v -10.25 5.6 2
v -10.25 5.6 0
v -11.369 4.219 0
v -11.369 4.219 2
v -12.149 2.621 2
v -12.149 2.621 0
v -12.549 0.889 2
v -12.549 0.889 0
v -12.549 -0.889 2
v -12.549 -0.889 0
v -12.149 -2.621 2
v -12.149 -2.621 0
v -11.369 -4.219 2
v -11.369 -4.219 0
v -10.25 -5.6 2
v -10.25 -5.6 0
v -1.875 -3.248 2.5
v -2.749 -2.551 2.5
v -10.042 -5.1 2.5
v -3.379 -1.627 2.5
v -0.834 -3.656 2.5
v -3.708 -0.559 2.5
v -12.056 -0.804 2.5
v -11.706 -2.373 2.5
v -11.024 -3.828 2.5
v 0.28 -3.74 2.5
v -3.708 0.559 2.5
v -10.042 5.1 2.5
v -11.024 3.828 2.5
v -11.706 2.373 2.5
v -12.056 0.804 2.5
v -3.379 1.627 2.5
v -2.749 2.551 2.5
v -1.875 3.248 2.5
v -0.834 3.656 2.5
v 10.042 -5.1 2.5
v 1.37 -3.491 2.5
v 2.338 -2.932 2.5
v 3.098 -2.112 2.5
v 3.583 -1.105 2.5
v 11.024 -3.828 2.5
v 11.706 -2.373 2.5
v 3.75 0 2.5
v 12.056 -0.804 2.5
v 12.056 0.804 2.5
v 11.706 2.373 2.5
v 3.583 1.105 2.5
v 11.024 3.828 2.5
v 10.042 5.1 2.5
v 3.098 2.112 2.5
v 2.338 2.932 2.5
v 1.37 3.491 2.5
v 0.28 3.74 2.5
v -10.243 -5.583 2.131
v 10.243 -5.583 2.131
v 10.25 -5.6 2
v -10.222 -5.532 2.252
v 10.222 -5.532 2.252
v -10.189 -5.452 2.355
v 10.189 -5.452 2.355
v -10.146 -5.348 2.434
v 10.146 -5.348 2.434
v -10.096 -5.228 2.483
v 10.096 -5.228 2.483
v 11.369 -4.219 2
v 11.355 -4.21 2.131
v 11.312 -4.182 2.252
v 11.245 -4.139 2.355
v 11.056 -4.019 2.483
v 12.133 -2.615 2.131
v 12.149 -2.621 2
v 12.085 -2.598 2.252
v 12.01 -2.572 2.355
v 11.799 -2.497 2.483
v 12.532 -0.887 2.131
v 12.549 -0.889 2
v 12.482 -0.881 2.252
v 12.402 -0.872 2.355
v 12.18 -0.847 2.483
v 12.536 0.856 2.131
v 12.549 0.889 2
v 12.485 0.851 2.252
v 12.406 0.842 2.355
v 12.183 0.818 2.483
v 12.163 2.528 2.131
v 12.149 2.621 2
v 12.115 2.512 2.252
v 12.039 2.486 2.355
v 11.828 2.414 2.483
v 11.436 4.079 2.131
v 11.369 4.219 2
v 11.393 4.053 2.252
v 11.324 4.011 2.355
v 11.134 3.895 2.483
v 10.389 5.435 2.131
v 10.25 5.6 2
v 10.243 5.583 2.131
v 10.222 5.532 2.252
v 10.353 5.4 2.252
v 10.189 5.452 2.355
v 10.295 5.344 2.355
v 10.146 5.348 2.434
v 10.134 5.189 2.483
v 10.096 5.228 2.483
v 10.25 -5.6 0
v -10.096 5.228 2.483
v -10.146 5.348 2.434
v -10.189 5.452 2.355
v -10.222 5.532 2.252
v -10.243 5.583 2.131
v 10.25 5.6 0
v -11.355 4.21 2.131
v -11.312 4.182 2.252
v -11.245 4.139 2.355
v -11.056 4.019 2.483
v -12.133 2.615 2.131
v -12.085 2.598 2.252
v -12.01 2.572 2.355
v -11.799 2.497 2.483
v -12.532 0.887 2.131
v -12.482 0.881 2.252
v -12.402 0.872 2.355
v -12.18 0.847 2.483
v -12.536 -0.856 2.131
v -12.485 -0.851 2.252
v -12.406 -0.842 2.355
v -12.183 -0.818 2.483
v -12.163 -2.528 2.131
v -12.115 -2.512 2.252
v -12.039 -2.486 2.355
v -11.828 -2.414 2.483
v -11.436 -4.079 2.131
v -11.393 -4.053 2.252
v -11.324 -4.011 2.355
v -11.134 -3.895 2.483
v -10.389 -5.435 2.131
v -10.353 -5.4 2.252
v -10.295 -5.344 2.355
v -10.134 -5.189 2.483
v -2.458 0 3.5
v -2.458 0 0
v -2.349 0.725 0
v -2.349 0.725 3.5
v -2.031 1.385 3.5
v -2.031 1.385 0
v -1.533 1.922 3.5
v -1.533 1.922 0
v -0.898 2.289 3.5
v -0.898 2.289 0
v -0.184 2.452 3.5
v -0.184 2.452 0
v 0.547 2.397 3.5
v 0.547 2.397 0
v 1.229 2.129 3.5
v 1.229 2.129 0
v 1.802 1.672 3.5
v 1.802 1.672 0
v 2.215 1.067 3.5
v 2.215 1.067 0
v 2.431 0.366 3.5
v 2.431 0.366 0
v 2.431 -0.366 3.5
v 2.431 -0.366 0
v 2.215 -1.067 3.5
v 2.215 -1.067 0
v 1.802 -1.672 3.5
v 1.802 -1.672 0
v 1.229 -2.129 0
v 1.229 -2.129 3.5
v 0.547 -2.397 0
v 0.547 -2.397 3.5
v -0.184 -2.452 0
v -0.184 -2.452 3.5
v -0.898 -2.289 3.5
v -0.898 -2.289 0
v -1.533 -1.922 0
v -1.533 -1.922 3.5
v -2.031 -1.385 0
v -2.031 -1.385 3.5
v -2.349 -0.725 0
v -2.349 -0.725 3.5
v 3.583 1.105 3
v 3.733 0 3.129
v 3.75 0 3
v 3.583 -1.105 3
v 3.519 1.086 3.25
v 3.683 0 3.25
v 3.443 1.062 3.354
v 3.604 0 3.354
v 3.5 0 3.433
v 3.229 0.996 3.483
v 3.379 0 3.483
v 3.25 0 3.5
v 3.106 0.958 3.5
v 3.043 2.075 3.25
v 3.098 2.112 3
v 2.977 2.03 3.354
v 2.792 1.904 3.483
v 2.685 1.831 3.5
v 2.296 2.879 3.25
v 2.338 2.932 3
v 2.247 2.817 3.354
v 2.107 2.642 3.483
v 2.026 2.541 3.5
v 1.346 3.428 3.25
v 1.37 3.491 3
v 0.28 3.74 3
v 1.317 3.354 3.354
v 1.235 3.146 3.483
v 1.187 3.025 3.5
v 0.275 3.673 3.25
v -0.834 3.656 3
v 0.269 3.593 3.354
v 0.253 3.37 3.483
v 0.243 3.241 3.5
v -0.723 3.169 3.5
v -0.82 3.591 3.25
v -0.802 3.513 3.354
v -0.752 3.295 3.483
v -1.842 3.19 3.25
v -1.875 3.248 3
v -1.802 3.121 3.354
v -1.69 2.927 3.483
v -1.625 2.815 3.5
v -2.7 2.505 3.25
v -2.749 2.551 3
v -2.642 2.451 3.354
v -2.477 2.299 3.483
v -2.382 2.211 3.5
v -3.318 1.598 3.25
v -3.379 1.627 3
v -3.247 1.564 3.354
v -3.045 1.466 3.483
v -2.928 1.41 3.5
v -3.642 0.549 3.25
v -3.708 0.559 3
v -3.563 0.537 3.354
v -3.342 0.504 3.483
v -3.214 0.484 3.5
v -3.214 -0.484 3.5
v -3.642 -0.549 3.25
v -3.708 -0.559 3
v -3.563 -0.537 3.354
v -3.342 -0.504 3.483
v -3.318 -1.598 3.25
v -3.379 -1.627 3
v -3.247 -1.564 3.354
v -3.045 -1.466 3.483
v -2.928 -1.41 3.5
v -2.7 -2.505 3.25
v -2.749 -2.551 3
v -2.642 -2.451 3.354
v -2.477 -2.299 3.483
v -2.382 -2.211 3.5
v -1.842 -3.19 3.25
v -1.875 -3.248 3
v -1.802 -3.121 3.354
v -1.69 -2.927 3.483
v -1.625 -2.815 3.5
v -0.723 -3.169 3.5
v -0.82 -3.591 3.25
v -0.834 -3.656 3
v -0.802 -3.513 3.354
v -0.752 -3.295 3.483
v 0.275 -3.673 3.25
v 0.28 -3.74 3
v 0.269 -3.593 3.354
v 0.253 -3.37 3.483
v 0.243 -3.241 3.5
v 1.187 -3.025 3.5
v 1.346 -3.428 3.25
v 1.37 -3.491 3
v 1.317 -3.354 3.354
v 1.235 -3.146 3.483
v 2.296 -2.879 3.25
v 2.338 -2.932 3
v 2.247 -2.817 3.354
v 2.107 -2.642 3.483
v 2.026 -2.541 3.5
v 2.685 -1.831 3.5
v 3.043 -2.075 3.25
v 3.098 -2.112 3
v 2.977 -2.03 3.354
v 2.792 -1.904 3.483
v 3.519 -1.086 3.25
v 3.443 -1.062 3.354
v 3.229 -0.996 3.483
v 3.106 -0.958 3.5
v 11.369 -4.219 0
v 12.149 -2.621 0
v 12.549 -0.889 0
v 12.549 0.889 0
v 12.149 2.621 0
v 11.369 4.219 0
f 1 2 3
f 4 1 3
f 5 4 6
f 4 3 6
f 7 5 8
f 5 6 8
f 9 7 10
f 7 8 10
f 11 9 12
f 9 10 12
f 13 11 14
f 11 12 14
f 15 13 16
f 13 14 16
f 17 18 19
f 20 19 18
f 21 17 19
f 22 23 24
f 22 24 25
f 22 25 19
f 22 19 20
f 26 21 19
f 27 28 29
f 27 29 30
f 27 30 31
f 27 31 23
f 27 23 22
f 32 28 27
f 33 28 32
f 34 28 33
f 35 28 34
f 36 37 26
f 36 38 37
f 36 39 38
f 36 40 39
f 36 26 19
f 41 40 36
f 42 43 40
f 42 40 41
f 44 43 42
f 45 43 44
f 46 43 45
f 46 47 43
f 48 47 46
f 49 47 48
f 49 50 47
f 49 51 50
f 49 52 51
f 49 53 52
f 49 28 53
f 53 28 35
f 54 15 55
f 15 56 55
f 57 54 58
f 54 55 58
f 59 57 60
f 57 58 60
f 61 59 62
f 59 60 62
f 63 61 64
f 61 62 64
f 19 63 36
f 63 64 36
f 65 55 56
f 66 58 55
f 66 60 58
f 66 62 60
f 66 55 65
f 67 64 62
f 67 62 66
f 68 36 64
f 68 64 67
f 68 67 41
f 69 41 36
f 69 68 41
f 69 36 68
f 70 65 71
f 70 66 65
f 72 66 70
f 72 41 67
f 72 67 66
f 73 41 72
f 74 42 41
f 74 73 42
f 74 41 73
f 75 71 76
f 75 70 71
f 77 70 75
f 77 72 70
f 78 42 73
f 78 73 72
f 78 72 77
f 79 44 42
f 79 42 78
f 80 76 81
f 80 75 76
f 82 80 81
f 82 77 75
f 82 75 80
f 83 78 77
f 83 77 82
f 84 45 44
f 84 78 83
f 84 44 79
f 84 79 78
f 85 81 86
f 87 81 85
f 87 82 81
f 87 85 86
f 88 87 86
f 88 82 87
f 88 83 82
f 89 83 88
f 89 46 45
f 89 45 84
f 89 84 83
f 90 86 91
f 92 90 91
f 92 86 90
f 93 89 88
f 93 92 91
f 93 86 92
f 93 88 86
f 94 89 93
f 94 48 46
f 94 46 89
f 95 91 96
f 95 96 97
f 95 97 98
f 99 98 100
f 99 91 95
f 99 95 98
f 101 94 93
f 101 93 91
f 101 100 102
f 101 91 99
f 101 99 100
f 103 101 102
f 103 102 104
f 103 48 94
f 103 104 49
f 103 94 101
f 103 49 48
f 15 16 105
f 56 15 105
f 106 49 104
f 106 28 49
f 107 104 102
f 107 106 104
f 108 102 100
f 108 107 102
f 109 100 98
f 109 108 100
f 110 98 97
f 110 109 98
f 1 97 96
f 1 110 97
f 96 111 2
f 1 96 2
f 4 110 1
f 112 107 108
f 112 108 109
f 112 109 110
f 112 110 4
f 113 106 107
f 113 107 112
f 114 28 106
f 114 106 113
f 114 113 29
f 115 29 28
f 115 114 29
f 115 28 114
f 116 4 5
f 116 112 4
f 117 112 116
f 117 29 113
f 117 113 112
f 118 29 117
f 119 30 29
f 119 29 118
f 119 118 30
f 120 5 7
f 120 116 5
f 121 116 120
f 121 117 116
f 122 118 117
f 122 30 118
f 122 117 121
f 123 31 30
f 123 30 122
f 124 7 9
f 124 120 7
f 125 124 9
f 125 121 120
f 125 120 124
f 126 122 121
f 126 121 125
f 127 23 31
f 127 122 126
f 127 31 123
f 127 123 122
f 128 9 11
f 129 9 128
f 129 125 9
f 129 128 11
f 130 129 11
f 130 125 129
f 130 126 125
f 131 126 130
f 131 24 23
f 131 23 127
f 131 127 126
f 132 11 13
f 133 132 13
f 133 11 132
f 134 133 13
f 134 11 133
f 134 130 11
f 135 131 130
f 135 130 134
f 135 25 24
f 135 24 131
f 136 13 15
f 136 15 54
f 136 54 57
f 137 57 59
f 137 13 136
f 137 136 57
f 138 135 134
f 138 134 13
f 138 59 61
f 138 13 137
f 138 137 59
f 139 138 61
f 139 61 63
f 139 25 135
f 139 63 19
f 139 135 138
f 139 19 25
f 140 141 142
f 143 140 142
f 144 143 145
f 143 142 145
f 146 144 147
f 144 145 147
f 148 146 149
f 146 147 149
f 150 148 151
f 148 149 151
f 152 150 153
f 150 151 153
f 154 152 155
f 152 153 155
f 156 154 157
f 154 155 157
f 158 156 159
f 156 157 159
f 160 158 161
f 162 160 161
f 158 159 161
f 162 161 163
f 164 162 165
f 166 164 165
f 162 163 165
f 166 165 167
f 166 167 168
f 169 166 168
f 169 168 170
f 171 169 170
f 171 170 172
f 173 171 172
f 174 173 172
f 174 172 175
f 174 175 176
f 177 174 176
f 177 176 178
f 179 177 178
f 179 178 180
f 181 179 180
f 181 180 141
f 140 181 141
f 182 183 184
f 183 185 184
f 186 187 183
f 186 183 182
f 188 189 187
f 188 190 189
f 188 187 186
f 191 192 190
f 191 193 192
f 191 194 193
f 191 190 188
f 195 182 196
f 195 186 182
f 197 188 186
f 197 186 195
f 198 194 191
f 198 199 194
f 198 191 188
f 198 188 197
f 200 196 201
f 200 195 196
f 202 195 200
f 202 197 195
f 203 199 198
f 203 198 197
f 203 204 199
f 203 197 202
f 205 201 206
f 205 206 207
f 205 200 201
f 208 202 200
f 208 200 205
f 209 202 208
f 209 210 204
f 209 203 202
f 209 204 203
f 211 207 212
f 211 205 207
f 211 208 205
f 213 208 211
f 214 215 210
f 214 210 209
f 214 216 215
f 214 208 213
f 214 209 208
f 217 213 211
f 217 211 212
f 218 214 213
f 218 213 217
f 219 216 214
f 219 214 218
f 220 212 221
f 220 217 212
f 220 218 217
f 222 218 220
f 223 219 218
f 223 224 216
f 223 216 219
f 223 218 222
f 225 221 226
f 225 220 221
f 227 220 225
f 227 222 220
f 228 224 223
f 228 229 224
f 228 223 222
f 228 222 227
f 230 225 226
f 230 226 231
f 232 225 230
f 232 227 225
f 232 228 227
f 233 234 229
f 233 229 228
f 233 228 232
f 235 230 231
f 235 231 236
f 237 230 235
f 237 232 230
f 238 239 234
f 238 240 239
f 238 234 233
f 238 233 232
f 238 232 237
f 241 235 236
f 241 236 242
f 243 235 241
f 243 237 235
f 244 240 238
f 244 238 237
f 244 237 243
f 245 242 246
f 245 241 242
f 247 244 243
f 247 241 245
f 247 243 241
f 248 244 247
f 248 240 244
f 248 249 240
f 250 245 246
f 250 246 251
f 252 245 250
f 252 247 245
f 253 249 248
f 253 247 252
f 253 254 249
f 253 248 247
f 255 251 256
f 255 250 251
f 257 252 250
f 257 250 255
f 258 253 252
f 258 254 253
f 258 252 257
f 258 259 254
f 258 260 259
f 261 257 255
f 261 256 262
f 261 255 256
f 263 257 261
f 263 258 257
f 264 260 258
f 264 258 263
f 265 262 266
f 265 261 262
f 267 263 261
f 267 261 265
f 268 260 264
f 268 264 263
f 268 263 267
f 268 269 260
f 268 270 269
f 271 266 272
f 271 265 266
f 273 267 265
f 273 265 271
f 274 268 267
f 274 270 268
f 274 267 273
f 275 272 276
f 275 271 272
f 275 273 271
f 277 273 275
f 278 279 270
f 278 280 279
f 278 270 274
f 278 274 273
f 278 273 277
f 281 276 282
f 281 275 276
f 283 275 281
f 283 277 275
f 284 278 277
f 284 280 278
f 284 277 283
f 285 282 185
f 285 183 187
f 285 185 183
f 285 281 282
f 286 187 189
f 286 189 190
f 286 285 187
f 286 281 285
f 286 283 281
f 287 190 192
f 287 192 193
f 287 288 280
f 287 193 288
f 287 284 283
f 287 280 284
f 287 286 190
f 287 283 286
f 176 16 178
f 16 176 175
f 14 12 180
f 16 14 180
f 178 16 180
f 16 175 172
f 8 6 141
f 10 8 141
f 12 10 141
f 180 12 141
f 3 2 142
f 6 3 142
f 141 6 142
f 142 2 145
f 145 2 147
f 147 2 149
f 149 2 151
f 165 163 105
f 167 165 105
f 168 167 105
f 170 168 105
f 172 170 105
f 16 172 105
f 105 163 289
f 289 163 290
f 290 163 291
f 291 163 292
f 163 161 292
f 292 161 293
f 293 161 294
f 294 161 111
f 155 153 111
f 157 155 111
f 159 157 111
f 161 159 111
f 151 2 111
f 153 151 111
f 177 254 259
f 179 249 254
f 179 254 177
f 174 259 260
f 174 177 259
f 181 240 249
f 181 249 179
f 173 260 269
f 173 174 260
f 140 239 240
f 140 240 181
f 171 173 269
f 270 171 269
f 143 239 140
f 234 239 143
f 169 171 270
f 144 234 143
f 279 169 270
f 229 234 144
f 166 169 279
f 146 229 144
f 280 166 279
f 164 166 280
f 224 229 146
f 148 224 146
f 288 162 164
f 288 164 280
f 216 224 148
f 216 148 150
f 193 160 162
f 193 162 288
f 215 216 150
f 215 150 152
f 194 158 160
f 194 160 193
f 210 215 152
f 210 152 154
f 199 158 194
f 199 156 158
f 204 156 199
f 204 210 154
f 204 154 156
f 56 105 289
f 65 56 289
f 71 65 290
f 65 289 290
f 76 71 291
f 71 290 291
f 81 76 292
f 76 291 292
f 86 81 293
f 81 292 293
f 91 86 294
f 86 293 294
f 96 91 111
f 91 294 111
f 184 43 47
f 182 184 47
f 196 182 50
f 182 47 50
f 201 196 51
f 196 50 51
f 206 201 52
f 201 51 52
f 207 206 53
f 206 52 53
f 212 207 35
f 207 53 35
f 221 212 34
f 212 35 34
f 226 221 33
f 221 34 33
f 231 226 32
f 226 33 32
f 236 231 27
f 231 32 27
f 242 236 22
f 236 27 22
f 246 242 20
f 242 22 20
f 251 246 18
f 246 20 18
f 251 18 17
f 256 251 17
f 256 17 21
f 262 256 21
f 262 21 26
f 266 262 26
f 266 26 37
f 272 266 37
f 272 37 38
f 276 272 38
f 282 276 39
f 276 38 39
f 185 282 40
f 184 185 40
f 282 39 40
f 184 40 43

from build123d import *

# Parameters (mm, degrees)
EXTRUSION1_DEPTH = 2.5
SKETCH2_R        = 3.75
EXTRUSION2_DEPTH = 1
HOLE1_D          = 4.917
FILLET1_R        = 0.5


with BuildPart() as part:
    # Sketch1 → Extrusion1 (new body)
    with BuildSketch(Plane.XY):
        with BuildLine():
            Line((-10.25, -5.6), (10.25, -5.6))
            ThreePointArc((10.25, -5.6), (12.6, 0), (10.25, 5.6))
            Line((10.25, 5.6), (-10.25, 5.6))
            ThreePointArc((-10.25, 5.6), (-12.6, 0), (-10.25, -5.6))
        make_face()
    extrude(amount=EXTRUSION1_DEPTH)

    # Sketch2 → Extrusion2 (add)
    with BuildSketch(Plane.XY.offset(2.5)):
        Circle(SKETCH2_R)
    extrude(amount=EXTRUSION2_DEPTH)

    # Hole1 (through all)
    with Locations(Plane.XY.offset(3.5)):
        with Locations((0, 0)):
            Hole(HOLE1_D / 2)

    # Fillet1
    fillet1_edges = [part.edges().sort_by_distance(p)[0] for p in [
        (12.6, 0, 2.5),
        (0, 5.6, 2.5),
        (-3.75, 0, 3.5),
        (-12.6, 0, 2.5),
        (0, -5.6, 2.5),
    ]]
    fillet(fillet1_edges, radius=FILLET1_R)


solid = part.part
